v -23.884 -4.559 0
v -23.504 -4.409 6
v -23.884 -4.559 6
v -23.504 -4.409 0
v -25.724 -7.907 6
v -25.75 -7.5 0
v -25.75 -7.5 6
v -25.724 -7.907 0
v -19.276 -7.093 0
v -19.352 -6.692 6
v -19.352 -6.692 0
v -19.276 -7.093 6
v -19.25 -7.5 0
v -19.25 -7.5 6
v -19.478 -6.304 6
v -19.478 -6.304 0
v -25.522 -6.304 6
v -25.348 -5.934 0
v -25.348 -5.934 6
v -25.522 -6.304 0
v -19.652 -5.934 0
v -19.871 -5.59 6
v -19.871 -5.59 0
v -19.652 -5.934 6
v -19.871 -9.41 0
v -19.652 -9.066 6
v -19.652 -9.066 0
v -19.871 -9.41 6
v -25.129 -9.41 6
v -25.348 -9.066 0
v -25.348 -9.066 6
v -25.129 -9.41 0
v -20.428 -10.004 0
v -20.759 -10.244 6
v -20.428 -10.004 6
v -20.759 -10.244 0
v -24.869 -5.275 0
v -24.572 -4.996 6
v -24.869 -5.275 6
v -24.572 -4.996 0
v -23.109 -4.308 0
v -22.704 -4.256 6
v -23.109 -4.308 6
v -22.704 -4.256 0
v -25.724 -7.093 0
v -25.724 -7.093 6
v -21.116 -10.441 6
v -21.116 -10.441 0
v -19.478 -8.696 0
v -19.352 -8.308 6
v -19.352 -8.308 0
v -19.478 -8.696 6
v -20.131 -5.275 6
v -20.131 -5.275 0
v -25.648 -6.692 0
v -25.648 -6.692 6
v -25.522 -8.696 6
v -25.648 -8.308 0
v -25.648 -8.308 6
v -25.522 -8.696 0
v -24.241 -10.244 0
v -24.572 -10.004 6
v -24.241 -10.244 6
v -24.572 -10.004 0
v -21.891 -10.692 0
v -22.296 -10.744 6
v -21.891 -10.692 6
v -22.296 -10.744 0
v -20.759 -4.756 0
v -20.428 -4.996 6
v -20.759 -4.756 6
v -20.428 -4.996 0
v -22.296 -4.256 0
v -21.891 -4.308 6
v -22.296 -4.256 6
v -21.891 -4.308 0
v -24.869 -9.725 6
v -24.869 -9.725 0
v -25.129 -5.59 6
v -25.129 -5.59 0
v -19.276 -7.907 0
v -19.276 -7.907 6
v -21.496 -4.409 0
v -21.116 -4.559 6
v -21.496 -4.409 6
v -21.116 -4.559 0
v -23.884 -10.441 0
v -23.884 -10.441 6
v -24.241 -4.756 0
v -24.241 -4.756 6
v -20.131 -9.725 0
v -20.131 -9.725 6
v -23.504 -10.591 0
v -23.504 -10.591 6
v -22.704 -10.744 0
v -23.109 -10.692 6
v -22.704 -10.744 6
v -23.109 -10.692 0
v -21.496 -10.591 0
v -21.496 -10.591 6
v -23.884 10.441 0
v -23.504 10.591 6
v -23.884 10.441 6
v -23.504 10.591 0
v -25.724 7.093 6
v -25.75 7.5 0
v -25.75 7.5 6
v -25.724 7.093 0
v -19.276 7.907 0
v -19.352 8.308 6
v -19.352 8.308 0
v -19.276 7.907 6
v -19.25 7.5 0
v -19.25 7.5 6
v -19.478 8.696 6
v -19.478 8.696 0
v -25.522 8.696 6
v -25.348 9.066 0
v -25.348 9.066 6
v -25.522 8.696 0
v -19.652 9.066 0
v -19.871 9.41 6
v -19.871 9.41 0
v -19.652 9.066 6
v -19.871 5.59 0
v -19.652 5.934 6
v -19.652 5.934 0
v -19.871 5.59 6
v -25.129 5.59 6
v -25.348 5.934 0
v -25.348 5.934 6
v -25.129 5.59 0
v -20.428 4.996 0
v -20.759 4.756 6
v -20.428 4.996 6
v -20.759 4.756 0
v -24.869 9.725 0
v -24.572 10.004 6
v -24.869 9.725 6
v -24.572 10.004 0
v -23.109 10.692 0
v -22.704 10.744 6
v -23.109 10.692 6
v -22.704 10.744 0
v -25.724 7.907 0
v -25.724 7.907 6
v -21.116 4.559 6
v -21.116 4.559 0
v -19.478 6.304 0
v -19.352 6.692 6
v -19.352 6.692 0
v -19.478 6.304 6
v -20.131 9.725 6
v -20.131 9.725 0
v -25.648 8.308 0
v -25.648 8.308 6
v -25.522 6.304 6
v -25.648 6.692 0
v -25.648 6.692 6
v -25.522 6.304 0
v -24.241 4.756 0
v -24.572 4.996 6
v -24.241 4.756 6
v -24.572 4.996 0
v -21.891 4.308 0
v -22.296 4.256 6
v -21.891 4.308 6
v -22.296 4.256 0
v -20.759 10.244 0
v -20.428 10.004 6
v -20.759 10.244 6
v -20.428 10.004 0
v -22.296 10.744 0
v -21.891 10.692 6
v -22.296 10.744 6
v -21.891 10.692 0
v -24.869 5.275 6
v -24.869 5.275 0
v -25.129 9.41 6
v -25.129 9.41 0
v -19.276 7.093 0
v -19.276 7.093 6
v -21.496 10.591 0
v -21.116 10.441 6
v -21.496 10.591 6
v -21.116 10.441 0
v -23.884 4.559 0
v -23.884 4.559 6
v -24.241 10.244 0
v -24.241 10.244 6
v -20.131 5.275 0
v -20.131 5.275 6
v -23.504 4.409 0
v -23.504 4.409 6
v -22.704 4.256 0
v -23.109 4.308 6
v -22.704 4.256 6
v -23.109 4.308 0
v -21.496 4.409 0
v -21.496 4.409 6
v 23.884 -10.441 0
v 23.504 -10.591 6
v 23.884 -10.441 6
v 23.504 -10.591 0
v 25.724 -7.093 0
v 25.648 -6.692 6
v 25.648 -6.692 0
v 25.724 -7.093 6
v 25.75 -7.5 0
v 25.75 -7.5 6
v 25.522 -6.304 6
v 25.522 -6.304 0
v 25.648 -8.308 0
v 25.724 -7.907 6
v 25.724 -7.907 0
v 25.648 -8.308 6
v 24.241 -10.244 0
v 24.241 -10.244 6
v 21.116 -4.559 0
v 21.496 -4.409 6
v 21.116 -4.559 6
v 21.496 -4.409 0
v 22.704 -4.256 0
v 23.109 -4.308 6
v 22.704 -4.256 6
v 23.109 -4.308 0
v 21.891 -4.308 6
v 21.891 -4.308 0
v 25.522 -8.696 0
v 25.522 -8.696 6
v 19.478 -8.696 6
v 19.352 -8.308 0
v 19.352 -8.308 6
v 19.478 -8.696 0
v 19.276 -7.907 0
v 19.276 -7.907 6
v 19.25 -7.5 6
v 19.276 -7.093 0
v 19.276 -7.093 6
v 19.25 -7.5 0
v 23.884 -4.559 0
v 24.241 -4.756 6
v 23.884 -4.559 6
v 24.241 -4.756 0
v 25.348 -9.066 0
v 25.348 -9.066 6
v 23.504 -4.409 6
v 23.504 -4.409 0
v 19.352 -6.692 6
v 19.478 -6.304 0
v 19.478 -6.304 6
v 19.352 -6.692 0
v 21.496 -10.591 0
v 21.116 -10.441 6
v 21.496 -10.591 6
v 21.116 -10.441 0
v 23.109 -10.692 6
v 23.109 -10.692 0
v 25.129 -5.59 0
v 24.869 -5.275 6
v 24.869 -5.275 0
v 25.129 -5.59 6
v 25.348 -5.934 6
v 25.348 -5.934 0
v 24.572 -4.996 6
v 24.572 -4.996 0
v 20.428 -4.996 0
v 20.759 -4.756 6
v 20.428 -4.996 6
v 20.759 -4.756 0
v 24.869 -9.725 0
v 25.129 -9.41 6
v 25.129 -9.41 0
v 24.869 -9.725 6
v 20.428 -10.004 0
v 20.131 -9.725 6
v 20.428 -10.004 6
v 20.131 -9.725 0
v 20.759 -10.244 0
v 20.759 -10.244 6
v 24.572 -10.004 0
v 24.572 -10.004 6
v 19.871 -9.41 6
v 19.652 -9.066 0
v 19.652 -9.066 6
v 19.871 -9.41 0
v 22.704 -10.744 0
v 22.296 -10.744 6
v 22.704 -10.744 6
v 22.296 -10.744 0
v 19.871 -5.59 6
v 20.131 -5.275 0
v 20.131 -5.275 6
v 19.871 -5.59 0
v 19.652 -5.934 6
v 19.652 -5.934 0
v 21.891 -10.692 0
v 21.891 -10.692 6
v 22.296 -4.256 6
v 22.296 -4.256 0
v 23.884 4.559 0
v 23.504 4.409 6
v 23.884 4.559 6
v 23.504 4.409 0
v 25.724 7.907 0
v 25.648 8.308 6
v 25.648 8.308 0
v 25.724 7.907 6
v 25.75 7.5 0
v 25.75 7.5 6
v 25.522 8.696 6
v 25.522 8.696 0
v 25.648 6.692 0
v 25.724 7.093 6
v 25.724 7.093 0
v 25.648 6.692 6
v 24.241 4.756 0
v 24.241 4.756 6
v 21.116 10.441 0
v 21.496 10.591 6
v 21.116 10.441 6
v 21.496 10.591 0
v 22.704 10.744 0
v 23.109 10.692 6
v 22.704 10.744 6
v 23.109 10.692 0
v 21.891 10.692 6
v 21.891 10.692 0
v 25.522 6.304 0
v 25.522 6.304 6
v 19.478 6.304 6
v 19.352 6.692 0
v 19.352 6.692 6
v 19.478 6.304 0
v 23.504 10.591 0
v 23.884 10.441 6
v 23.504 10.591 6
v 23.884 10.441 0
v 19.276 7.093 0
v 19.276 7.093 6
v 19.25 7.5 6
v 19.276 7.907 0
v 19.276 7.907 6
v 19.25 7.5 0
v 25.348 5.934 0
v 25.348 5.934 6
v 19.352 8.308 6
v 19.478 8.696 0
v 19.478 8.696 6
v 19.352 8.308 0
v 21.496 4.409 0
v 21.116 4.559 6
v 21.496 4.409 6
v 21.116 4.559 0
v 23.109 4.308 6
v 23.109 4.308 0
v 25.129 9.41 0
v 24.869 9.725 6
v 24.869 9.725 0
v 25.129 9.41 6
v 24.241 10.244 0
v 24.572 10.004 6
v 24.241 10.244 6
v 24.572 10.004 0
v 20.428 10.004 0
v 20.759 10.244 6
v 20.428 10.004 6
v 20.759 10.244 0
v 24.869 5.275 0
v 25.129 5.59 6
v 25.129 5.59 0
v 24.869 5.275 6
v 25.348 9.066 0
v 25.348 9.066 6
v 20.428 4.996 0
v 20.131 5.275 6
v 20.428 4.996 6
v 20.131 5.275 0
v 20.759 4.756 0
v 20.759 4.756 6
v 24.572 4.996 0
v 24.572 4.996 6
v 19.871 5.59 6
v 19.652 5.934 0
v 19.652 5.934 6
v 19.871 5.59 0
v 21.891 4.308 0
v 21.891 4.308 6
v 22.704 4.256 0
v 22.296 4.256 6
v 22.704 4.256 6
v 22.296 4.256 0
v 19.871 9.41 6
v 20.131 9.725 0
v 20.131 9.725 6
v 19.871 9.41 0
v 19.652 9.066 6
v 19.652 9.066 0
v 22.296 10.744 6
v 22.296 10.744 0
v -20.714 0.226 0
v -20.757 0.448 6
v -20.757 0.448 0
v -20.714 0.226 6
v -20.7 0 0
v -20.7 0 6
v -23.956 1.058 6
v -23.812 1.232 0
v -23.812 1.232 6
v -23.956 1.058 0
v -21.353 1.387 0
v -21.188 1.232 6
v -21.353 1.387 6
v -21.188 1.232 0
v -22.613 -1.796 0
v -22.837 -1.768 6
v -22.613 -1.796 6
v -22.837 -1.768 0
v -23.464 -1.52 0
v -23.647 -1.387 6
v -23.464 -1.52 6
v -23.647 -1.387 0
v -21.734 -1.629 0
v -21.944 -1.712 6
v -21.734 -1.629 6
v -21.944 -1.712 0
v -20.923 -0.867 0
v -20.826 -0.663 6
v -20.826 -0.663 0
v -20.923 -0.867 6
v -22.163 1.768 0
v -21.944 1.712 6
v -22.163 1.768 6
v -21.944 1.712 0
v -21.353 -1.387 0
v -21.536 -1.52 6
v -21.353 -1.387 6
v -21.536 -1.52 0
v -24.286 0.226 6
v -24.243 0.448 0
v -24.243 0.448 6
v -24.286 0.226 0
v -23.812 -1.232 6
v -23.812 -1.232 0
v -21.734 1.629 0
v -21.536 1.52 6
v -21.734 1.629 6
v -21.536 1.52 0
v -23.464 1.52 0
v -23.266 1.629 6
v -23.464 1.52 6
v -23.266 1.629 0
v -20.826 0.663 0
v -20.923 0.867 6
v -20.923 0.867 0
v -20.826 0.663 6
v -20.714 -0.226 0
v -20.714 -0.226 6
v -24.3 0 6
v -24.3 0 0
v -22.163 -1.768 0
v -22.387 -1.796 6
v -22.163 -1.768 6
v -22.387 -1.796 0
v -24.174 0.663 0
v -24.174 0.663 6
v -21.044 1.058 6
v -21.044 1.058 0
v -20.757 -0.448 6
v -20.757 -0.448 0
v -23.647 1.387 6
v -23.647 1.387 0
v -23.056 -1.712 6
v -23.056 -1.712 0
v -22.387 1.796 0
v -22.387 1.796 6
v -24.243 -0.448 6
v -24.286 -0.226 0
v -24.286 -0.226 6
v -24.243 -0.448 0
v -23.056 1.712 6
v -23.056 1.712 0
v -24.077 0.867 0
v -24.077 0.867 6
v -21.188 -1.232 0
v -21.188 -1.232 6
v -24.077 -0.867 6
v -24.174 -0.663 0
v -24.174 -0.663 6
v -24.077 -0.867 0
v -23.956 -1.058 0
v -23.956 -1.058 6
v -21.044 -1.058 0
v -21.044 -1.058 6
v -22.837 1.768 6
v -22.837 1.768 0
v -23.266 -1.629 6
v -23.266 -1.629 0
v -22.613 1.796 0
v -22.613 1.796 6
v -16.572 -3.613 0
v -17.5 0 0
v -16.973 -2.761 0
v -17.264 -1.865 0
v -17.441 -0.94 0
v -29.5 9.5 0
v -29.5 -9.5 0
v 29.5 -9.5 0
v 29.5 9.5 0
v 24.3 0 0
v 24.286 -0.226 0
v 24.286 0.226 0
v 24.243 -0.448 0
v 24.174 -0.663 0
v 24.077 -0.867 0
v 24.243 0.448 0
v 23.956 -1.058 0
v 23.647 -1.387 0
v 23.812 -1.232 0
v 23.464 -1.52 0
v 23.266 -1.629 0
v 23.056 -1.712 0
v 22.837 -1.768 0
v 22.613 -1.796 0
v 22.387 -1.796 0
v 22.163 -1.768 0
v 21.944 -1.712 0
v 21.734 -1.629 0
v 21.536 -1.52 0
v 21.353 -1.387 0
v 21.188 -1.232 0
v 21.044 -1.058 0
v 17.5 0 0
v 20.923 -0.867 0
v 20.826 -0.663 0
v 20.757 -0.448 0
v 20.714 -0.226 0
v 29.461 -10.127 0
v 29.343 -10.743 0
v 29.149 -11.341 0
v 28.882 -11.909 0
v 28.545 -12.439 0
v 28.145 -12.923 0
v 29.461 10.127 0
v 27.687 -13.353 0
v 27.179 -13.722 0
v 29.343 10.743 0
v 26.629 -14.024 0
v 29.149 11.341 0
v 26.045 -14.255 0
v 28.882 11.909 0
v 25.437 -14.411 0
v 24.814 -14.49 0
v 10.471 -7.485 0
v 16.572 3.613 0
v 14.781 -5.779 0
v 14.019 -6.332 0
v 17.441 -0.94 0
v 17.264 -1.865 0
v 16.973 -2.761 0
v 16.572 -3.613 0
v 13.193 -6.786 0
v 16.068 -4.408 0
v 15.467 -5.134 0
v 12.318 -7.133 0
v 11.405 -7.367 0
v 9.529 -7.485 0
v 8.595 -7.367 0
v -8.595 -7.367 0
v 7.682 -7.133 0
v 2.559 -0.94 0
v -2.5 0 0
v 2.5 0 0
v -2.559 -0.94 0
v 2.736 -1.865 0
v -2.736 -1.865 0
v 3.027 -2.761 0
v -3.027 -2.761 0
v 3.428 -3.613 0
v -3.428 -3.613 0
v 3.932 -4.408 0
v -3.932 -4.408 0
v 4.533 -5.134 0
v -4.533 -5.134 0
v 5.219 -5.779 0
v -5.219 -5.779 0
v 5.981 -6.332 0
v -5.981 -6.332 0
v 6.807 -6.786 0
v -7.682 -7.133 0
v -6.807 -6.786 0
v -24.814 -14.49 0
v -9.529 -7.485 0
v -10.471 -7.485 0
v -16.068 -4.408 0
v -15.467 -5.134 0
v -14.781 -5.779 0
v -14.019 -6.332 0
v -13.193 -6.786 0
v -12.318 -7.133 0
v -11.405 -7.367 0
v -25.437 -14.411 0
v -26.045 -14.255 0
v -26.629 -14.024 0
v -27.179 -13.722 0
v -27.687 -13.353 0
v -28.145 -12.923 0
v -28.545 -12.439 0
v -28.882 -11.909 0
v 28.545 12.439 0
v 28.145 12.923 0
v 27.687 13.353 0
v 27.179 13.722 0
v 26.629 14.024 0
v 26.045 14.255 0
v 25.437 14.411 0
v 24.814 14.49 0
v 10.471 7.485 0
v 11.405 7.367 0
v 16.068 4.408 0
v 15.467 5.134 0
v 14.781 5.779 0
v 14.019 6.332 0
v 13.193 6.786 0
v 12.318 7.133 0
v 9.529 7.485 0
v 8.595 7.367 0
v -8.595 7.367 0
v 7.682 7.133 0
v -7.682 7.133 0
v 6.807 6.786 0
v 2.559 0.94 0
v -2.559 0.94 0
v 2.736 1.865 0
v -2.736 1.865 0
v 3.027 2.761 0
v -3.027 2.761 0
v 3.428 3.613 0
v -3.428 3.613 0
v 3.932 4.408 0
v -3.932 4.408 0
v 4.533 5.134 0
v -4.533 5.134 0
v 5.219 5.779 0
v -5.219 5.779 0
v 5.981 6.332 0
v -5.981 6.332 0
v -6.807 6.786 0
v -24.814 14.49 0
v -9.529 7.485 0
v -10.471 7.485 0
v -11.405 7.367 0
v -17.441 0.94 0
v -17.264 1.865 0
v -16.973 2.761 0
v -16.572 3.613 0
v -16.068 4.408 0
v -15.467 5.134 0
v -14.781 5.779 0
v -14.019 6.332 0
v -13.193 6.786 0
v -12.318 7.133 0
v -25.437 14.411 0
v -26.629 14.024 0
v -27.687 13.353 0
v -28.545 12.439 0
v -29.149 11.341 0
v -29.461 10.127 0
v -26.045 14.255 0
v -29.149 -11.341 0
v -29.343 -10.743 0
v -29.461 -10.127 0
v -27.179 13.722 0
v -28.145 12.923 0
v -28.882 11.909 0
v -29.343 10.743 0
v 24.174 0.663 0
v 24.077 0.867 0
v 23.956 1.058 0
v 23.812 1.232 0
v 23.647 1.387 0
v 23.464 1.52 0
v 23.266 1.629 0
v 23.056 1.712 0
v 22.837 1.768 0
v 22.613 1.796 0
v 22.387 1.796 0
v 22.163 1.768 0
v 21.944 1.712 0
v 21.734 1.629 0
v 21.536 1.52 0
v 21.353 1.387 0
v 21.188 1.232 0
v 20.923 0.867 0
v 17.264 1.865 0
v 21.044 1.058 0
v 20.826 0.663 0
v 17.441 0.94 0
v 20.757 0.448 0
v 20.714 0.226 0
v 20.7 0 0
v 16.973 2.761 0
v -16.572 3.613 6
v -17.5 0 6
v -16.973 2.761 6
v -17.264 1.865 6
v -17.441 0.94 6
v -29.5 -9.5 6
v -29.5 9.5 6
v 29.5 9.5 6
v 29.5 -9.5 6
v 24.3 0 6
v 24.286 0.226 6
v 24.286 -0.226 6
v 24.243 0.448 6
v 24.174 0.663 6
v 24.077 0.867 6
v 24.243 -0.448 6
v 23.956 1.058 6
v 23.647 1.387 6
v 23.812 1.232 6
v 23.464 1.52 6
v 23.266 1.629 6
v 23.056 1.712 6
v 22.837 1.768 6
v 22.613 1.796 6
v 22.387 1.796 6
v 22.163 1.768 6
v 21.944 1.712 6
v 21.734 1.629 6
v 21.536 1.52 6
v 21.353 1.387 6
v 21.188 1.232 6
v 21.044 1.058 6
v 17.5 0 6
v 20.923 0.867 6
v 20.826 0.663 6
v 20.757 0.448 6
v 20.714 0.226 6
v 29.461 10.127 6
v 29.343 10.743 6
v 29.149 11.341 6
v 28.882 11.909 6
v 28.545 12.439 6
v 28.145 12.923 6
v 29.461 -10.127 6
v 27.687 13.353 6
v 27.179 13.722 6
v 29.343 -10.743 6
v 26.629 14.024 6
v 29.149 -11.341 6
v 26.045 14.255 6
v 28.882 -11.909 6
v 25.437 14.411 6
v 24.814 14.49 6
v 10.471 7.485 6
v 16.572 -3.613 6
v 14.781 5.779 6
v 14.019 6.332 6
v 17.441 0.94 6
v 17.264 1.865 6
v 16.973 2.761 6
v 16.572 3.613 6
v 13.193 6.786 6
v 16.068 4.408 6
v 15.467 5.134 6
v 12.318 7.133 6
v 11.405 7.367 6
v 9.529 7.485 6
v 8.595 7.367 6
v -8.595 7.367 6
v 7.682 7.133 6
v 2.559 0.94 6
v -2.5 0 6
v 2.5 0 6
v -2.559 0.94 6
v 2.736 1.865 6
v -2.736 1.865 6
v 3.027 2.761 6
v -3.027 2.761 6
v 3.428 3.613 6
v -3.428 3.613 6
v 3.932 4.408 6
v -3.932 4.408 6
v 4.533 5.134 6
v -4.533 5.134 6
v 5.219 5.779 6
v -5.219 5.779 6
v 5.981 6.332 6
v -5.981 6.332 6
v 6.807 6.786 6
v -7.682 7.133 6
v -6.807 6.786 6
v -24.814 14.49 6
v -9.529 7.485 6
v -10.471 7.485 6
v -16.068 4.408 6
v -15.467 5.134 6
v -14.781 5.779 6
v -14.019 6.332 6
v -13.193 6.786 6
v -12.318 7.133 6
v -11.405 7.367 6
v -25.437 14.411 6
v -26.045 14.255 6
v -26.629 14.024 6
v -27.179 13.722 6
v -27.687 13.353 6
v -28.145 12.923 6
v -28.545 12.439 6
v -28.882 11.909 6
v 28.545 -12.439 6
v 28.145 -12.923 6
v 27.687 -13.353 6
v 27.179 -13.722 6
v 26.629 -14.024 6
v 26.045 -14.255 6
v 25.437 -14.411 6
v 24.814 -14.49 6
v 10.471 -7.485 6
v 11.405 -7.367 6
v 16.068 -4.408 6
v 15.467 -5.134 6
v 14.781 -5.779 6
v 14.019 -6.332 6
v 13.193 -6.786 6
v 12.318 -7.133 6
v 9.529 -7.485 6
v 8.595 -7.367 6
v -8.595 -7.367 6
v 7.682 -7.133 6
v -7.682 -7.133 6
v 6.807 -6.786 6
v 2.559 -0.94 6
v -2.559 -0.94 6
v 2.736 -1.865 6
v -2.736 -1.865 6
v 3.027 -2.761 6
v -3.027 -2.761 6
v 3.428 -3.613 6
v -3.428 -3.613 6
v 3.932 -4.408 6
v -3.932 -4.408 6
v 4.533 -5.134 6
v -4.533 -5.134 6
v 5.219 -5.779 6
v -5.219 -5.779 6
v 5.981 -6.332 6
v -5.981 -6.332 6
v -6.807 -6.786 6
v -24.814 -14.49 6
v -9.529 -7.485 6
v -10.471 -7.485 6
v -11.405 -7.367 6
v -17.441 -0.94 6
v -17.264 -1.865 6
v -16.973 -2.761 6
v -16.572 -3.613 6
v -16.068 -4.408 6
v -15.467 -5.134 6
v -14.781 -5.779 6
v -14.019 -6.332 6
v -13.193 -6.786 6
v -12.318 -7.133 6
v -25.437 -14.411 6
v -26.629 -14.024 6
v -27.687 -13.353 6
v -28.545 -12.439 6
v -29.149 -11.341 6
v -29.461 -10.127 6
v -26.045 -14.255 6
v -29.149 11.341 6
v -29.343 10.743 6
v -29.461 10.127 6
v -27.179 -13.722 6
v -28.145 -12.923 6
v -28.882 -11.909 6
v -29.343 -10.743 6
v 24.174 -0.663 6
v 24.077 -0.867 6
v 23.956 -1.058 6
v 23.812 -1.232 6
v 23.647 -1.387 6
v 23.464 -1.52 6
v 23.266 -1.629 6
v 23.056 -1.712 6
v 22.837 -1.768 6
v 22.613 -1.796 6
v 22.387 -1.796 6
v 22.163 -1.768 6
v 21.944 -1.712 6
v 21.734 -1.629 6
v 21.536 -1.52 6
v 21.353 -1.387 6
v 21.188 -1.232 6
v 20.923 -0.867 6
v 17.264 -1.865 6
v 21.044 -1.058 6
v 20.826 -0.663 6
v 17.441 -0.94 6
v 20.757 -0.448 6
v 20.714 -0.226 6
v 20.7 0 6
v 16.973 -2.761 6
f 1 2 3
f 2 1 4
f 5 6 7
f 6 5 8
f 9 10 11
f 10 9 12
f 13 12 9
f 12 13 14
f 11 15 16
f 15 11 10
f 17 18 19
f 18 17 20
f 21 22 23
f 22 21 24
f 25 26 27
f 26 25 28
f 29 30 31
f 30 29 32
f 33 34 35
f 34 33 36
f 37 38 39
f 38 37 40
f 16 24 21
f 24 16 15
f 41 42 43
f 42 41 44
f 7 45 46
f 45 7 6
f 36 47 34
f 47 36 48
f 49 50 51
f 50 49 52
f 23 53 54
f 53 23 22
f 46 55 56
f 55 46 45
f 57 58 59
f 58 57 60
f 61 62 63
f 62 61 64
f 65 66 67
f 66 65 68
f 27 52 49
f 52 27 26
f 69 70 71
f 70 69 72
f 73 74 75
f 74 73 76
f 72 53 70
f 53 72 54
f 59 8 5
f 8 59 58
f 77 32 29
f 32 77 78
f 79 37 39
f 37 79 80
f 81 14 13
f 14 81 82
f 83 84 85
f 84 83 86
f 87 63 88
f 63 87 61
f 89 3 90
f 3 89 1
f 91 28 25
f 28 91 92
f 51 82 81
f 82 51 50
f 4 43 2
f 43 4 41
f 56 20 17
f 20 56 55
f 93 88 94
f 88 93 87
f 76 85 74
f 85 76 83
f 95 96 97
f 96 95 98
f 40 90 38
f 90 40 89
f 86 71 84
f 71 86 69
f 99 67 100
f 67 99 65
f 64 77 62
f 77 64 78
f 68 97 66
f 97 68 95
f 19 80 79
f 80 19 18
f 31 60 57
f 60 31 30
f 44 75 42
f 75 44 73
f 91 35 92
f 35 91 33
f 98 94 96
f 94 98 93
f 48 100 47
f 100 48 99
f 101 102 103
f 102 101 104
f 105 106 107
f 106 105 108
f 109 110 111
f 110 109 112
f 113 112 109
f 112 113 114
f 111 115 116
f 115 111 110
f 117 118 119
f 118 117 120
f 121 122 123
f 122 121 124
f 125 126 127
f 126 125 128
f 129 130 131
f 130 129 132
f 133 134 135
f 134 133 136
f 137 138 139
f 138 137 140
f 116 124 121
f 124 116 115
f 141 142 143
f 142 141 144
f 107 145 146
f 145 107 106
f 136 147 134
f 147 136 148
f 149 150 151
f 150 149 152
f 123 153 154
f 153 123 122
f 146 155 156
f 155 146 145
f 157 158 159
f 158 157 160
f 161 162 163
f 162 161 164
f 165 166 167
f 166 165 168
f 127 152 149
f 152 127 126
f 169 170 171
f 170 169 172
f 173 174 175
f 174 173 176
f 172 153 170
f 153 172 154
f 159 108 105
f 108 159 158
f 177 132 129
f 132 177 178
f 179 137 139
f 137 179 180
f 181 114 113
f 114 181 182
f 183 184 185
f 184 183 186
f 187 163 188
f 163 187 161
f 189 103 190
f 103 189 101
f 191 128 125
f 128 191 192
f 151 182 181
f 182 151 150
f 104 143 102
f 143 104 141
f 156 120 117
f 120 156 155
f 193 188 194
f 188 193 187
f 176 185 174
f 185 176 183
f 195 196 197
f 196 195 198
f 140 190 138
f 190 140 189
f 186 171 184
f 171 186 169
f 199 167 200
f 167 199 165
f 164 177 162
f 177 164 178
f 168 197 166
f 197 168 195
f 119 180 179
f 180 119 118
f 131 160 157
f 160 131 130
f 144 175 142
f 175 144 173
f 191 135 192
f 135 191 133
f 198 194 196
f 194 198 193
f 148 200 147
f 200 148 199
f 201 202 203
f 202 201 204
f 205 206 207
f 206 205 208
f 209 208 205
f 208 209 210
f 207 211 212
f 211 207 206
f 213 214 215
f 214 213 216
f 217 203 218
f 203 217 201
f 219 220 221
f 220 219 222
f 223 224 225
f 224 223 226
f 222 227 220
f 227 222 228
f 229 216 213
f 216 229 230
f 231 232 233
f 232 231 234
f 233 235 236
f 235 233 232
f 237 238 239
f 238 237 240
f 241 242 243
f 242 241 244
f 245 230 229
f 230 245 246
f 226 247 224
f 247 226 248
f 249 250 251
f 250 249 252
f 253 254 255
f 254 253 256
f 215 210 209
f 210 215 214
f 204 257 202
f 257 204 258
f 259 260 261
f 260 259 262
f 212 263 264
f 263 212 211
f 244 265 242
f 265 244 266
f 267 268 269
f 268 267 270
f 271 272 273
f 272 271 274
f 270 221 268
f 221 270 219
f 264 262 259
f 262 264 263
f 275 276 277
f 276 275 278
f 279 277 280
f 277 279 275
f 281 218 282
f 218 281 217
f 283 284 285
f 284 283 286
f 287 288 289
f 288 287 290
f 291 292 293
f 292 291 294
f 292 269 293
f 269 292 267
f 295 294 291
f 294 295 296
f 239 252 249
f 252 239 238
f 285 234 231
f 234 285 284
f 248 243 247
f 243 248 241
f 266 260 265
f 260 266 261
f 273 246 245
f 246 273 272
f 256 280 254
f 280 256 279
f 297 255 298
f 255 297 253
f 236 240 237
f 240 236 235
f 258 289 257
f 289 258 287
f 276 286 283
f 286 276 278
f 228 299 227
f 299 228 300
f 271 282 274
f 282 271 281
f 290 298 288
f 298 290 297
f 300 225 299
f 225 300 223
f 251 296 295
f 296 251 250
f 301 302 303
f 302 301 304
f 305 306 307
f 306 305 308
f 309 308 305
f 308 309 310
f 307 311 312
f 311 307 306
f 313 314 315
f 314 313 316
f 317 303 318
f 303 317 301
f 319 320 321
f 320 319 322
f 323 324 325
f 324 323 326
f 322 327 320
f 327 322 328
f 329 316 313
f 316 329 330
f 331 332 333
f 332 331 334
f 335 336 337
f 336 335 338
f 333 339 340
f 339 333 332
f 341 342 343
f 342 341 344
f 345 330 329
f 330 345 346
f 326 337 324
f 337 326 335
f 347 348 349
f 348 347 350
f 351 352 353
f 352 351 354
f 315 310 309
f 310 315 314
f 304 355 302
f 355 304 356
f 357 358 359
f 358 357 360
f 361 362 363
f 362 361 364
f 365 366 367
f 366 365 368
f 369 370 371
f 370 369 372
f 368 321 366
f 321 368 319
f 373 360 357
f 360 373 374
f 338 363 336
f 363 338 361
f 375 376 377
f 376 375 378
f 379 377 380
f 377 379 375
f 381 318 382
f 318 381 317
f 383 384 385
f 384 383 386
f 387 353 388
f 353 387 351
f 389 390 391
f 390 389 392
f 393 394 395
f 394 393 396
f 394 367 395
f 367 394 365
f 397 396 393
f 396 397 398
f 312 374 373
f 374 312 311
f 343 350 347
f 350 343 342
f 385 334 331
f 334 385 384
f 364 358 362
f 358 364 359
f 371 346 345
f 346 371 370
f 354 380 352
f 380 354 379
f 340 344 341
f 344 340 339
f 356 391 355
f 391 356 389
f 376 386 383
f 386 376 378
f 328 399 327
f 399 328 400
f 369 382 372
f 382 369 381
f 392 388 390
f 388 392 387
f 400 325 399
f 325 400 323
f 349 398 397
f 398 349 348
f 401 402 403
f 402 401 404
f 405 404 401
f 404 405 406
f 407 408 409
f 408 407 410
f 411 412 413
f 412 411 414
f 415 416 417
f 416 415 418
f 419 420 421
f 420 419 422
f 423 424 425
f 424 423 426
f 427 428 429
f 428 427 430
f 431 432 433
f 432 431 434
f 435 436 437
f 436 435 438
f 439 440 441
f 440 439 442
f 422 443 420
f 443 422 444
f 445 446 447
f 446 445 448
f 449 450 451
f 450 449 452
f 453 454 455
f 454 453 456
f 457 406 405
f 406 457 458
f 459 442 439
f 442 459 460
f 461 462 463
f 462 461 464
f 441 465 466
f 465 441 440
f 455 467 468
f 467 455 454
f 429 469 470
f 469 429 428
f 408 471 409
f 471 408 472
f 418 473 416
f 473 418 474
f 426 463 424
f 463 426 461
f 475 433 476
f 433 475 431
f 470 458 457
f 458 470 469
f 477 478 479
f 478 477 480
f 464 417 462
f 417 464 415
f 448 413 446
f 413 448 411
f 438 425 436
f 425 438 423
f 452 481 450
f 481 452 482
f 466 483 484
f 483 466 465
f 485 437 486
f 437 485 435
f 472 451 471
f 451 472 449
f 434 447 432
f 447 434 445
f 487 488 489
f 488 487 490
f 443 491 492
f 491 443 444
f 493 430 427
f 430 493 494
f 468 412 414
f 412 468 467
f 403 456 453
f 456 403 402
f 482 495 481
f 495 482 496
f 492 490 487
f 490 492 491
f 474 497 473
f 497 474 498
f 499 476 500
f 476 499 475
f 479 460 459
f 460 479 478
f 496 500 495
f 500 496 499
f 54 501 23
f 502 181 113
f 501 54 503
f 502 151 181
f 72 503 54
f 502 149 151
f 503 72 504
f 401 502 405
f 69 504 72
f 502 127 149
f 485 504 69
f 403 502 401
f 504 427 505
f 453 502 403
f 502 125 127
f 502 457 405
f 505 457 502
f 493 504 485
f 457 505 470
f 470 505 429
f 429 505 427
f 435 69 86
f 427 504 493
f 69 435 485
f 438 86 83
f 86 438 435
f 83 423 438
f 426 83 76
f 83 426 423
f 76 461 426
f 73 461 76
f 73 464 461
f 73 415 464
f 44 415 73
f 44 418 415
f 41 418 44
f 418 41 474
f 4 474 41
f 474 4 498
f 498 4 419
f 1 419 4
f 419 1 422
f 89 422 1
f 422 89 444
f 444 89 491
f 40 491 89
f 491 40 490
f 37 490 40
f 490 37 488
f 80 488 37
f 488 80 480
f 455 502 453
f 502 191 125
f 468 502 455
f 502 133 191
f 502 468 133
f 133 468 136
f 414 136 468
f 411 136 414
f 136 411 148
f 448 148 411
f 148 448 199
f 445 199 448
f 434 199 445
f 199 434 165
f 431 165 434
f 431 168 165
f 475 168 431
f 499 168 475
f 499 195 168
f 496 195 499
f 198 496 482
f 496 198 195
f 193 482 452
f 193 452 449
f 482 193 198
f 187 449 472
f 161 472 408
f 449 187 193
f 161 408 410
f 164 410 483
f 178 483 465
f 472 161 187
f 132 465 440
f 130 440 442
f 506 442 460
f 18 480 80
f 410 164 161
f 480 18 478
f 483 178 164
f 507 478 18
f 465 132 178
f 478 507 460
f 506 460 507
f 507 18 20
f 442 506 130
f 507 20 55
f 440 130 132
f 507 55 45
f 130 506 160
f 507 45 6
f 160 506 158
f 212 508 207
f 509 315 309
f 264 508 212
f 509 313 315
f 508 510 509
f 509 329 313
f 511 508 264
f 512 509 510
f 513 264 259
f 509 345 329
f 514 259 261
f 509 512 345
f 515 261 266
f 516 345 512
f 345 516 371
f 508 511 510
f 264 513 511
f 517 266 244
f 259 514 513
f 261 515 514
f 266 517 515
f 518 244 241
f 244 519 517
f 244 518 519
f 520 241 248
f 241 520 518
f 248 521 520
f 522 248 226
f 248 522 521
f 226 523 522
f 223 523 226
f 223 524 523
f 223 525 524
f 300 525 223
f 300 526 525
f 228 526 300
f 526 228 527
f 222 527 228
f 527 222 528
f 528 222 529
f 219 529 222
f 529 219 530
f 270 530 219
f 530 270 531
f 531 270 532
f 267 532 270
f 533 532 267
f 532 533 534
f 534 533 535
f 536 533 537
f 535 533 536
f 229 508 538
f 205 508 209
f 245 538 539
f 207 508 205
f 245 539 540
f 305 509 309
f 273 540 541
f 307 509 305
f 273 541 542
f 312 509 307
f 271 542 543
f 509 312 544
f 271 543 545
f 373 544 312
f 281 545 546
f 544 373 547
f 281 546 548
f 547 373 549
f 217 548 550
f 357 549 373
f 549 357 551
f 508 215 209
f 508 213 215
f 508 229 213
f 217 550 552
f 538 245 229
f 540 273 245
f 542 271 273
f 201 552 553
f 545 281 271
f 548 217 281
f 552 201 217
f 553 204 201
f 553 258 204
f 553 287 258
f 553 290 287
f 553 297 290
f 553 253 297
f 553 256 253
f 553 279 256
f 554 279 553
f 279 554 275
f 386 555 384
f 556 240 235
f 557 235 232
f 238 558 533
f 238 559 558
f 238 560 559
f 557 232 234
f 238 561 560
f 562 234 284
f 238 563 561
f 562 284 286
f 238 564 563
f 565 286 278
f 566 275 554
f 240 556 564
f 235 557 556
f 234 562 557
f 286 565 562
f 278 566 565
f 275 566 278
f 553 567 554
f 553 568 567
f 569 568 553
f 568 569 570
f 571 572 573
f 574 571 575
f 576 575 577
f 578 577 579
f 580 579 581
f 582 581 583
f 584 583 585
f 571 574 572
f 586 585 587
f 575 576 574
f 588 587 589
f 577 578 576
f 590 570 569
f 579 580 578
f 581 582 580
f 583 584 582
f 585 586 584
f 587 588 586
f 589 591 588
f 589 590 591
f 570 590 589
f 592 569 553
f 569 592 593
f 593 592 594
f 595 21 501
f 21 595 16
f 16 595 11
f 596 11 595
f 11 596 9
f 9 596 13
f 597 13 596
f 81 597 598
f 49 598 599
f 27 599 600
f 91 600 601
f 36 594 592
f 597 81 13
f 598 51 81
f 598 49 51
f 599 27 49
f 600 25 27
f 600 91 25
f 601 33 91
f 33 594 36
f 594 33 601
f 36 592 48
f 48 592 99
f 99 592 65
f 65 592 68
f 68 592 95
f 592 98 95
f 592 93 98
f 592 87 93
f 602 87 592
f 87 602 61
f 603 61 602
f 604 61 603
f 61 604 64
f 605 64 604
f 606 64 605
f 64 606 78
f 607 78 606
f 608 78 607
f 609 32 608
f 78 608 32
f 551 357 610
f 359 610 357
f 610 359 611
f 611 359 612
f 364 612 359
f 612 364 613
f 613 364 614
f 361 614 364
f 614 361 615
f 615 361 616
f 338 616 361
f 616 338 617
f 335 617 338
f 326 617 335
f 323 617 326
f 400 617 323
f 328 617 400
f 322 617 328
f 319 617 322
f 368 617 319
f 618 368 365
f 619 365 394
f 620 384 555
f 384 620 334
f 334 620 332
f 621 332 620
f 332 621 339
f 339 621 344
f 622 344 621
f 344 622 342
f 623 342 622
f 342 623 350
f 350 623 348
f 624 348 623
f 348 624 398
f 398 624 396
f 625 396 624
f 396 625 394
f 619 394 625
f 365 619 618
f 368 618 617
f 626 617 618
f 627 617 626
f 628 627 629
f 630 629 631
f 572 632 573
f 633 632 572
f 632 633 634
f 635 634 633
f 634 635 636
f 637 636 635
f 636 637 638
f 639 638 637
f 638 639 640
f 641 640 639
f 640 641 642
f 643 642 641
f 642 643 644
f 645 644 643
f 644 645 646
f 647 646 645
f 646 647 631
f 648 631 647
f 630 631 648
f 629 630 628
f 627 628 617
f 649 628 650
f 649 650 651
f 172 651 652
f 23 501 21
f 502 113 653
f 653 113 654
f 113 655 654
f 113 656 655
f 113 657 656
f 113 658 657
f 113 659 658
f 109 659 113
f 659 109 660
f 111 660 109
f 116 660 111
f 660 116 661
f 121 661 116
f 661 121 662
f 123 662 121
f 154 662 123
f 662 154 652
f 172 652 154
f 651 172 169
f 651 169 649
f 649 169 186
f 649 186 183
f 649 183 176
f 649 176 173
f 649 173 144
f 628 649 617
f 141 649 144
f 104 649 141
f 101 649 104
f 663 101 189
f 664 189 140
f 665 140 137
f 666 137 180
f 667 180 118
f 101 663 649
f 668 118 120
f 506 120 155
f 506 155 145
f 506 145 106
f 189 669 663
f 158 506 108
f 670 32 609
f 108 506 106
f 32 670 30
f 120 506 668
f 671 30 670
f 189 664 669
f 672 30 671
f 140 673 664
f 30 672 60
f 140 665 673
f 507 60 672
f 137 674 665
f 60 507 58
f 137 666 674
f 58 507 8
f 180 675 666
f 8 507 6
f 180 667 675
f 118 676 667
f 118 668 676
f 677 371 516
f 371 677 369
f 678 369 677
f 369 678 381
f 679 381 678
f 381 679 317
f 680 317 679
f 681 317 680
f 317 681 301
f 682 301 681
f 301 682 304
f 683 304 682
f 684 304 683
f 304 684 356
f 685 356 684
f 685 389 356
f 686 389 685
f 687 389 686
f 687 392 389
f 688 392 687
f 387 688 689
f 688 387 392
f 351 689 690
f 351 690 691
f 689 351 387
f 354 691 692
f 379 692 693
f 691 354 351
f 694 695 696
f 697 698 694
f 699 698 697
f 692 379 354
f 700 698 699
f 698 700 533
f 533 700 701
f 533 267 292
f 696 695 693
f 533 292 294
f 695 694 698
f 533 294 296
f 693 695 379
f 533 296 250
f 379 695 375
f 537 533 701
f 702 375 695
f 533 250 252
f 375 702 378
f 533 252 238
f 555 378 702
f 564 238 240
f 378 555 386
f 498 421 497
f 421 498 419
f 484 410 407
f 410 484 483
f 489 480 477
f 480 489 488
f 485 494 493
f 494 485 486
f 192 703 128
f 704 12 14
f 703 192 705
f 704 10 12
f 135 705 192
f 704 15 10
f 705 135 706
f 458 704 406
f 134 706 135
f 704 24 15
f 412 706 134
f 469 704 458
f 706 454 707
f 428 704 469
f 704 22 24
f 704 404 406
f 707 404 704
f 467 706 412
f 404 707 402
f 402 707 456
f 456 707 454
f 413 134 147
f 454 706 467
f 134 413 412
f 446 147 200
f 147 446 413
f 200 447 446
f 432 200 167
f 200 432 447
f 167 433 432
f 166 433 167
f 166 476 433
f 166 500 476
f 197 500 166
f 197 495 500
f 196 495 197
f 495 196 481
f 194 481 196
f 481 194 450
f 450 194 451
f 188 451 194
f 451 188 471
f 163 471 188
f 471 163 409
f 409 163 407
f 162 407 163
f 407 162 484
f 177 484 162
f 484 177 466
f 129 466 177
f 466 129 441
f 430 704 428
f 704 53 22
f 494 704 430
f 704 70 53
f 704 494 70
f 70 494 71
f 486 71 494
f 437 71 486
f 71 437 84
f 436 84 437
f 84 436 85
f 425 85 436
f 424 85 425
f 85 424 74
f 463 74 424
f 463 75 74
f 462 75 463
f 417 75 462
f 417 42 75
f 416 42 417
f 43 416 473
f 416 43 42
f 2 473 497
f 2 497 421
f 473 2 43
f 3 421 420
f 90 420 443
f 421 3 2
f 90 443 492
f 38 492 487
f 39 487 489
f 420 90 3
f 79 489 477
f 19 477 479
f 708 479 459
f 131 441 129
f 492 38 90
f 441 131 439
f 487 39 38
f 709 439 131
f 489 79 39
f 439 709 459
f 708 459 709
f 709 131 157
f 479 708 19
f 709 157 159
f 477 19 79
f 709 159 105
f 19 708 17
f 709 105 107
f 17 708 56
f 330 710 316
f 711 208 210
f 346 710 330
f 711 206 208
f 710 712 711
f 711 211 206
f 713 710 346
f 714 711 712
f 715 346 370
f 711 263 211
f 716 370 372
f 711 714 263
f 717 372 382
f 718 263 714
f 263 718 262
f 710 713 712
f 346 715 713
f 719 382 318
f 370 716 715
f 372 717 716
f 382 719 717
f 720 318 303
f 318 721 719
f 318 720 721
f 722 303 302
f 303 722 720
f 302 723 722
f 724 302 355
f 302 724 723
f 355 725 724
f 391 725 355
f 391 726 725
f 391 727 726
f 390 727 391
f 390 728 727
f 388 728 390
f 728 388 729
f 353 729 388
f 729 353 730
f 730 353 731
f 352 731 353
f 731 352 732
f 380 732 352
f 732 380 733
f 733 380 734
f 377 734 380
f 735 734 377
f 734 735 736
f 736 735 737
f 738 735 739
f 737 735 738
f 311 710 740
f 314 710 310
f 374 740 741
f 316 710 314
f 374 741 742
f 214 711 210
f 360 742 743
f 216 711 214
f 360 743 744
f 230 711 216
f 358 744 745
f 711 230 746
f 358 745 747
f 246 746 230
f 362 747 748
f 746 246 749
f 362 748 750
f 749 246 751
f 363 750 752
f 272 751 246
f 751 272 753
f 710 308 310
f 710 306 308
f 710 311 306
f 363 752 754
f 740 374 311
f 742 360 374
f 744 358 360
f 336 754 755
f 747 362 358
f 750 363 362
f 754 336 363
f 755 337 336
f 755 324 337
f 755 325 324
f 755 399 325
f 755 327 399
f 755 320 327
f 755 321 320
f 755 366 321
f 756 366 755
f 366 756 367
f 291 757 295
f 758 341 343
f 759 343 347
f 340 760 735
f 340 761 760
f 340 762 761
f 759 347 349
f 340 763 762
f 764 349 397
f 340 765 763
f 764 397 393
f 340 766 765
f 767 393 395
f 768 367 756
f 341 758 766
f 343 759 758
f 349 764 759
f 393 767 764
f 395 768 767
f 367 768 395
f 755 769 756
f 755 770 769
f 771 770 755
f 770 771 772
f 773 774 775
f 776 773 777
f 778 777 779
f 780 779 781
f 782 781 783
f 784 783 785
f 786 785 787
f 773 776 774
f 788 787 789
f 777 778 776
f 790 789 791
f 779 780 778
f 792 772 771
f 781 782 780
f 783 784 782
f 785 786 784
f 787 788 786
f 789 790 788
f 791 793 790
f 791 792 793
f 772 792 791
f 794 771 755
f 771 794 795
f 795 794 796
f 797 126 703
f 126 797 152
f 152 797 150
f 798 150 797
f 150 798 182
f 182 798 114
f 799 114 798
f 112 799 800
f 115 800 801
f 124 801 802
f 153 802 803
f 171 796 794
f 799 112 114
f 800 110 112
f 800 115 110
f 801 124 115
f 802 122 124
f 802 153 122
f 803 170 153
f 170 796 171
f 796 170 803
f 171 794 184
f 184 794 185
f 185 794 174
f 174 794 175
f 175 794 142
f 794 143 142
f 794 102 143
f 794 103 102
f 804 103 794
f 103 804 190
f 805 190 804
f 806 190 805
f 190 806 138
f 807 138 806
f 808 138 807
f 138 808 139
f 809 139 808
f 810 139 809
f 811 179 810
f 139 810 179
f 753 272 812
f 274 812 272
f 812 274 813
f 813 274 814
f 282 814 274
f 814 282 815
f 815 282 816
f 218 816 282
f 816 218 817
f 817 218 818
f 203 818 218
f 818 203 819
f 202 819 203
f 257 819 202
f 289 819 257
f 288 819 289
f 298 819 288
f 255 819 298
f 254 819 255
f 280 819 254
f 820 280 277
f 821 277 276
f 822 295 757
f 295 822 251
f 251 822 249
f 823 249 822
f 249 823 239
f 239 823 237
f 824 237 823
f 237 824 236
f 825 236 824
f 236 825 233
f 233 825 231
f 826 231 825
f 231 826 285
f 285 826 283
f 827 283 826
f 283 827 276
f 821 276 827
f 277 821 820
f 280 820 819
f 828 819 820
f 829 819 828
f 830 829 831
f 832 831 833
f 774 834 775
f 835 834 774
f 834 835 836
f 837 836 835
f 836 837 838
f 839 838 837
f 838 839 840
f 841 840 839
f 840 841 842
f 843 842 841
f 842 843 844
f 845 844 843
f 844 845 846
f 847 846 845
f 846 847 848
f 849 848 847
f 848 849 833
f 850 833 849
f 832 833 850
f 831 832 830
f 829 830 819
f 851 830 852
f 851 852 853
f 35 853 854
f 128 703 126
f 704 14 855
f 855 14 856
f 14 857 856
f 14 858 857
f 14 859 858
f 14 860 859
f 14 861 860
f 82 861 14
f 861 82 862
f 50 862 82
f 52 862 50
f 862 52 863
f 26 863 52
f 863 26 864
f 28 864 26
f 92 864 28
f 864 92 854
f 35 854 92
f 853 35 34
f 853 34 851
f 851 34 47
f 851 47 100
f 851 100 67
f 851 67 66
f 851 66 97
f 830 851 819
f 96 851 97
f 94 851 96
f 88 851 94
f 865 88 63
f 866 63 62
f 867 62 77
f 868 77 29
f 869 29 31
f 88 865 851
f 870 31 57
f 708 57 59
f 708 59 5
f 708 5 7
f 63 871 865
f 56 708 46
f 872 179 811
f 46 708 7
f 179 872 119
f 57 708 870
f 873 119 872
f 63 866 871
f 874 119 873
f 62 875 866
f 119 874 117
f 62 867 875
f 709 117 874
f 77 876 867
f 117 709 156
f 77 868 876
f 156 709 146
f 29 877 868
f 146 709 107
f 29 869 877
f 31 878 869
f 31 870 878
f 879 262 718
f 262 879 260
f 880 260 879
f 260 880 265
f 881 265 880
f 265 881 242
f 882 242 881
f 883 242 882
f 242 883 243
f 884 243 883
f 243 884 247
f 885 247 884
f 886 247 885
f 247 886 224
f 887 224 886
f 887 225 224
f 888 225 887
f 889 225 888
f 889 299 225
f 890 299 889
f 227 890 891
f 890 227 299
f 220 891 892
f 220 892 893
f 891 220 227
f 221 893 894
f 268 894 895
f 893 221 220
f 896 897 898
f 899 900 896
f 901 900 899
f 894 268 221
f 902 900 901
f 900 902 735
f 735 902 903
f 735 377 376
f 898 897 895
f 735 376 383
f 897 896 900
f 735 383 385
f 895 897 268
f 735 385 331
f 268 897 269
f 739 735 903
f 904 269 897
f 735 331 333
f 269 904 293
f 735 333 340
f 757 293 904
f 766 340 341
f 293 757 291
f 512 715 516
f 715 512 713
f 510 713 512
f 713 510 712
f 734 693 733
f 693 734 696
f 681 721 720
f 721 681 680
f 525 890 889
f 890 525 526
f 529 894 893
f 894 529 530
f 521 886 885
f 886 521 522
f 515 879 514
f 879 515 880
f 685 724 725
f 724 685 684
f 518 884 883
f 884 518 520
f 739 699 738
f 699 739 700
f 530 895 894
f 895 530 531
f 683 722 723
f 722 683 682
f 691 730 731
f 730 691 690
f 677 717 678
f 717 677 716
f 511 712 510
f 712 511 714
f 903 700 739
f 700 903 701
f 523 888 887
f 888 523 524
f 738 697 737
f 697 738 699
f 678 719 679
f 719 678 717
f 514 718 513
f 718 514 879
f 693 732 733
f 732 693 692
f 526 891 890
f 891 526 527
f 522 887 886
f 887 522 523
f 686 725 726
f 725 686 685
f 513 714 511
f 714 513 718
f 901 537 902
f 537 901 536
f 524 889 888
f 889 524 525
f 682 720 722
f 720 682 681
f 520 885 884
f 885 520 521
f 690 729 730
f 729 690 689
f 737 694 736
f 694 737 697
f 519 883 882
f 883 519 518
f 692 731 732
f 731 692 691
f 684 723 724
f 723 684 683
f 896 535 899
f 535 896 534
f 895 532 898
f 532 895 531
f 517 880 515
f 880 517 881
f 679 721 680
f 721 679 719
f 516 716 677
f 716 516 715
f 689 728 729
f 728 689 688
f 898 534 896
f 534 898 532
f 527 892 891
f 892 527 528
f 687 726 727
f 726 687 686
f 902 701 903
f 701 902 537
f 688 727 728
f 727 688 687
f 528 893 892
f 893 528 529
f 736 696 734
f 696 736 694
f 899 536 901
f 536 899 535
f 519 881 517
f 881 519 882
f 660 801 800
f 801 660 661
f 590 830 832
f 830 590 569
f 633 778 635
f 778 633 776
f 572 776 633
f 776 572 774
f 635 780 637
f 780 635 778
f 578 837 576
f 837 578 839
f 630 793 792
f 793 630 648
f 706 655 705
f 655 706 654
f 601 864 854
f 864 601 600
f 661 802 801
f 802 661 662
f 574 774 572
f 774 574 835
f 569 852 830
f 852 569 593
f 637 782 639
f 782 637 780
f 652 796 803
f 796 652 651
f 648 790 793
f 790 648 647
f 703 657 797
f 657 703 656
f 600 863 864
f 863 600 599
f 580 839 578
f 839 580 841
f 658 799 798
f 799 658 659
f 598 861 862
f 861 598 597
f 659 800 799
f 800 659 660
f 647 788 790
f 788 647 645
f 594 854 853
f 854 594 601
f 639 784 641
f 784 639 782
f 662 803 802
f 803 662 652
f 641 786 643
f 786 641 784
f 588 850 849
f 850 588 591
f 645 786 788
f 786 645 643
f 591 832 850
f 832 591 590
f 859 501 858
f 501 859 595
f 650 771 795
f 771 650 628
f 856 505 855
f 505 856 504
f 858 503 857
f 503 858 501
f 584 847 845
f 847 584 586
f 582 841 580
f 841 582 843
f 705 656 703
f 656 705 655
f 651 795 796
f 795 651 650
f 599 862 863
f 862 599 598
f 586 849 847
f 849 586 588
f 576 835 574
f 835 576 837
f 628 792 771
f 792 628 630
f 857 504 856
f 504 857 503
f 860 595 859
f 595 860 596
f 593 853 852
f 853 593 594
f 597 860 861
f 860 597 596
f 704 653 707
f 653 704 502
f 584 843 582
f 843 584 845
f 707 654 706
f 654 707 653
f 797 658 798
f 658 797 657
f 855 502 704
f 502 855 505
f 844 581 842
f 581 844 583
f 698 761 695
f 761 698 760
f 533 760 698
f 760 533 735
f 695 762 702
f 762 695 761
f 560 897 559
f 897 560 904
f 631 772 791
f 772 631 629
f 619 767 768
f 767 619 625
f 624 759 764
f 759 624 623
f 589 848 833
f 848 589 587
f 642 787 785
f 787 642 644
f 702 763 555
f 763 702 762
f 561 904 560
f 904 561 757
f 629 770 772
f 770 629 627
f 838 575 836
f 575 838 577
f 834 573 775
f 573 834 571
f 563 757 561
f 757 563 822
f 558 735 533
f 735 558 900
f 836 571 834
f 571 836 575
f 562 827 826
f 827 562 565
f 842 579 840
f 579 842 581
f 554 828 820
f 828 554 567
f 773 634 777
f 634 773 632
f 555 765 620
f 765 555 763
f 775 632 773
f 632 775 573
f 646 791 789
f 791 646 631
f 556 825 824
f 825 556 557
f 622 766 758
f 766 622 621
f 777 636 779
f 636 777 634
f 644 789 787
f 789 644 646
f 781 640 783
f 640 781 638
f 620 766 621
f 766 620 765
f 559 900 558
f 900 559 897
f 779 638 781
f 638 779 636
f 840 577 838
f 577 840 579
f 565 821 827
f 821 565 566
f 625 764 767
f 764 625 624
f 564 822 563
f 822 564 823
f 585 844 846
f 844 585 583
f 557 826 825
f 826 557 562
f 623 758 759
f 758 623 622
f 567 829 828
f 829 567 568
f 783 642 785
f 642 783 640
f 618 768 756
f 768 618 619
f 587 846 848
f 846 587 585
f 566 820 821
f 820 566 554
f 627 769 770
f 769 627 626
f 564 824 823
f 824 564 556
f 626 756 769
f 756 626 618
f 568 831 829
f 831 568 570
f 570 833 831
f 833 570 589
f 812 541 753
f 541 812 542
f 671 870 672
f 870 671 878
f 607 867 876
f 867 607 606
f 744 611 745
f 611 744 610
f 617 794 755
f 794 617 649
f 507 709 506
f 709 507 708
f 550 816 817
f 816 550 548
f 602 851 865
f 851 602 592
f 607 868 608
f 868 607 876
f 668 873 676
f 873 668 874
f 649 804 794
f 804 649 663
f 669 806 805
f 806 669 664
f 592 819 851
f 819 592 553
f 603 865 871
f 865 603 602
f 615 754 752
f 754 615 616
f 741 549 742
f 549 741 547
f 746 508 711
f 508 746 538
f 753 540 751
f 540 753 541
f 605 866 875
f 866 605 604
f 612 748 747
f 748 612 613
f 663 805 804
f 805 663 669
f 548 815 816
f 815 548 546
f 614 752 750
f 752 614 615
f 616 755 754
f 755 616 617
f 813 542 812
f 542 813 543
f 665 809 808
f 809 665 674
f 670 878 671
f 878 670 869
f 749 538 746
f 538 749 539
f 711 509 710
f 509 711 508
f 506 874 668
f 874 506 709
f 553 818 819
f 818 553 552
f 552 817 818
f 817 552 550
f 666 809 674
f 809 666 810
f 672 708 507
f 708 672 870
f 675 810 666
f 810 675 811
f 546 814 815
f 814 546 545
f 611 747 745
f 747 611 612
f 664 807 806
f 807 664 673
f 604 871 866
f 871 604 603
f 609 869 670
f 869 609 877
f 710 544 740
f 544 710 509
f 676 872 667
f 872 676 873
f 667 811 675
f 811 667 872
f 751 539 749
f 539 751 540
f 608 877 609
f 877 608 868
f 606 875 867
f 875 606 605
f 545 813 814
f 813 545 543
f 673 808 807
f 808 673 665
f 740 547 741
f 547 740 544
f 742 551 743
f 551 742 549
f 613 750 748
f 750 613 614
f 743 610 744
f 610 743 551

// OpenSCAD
$fn = 50;


difference() {
	union() {
		hull() {
			translate(v = [-24.5000000000, 9.5000000000, 0]) {
				cylinder(h = 6, r = 5);
			}
			translate(v = [24.5000000000, 9.5000000000, 0]) {
				cylinder(h = 6, r = 5);
			}
			translate(v = [-24.5000000000, -9.5000000000, 0]) {
				cylinder(h = 6, r = 5);
			}
			translate(v = [24.5000000000, -9.5000000000, 0]) {
				cylinder(h = 6, r = 5);
			}
		}
	}
	union() {
		#translate(v = [-22.5000000000, -7.5000000000, 0]) {
			cylinder(h = 6, r = 3.2500000000);
		}
		#translate(v = [-22.5000000000, 7.5000000000, 0]) {
			cylinder(h = 6, r = 3.2500000000);
		}
		#translate(v = [22.5000000000, -7.5000000000, 0]) {
			cylinder(h = 6, r = 3.2500000000);
		}
		#translate(v = [22.5000000000, 7.5000000000, 0]) {
			cylinder(h = 6, r = 3.2500000000);
		}
		#translate(v = [-22.5000000000, -7.5000000000, -100.0000000000]) {
			cylinder(h = 200, r = 3.2500000000);
		}
		#translate(v = [-22.5000000000, 7.5000000000, -100.0000000000]) {
			cylinder(h = 200, r = 3.2500000000);
		}
		#translate(v = [22.5000000000, -7.5000000000, -100.0000000000]) {
			cylinder(h = 200, r = 3.2500000000);
		}
		#translate(v = [22.5000000000, 7.5000000000, -100.0000000000]) {
			cylinder(h = 200, r = 3.2500000000);
		}
		#translate(v = [-22.5000000000, -7.5000000000, 0]) {
			cylinder(h = 6, r = 1.8000000000);
		}
		#translate(v = [-22.5000000000, 0.0000000000, 0]) {
			cylinder(h = 6, r = 1.8000000000);
		}
		#translate(v = [-22.5000000000, 7.5000000000, 0]) {
			cylinder(h = 6, r = 1.8000000000);
		}
		#translate(v = [22.5000000000, -7.5000000000, 0]) {
			cylinder(h = 6, r = 1.8000000000);
		}
		#translate(v = [22.5000000000, 0.0000000000, 0]) {
			cylinder(h = 6, r = 1.8000000000);
		}
		#translate(v = [22.5000000000, 7.5000000000, 0]) {
			cylinder(h = 6, r = 1.8000000000);
		}
		#translate(v = [-22.5000000000, -7.5000000000, 0]) {
			cylinder(h = 6, r = 1.8000000000);
		}
		#translate(v = [-22.5000000000, 0.0000000000, 0]) {
			cylinder(h = 6, r = 1.8000000000);
		}
		#translate(v = [-22.5000000000, 7.5000000000, 0]) {
			cylinder(h = 6, r = 1.8000000000);
		}
		#translate(v = [22.5000000000, -7.5000000000, 0]) {
			cylinder(h = 6, r = 1.8000000000);
		}
		#translate(v = [22.5000000000, 0.0000000000, 0]) {
			cylinder(h = 6, r = 1.8000000000);
		}
		#translate(v = [22.5000000000, 7.5000000000, 0]) {
			cylinder(h = 6, r = 1.8000000000);
		}
		#translate(v = [-22.5000000000, -7.5000000000, 0]) {
			cylinder(h = 6, r = 1.8000000000);
		}
		#translate(v = [-22.5000000000, 0.0000000000, 0]) {
			cylinder(h = 6, r = 1.8000000000);
		}
		#translate(v = [-22.5000000000, 7.5000000000, 0]) {
			cylinder(h = 6, r = 1.8000000000);
		}
		#translate(v = [22.5000000000, -7.5000000000, 0]) {
			cylinder(h = 6, r = 1.8000000000);
		}
		#translate(v = [22.5000000000, 0.0000000000, 0]) {
			cylinder(h = 6, r = 1.8000000000);
		}
		#translate(v = [22.5000000000, 7.5000000000, 0]) {
			cylinder(h = 6, r = 1.8000000000);
		}
		#translate(v = [-10.0000000000, 0, 0]) {
			cylinder(h = 6, r = 7.5000000000);
		}
		#translate(v = [10.0000000000, 0, 0]) {
			cylinder(h = 6, r = 7.5000000000);
		}
	}
}
